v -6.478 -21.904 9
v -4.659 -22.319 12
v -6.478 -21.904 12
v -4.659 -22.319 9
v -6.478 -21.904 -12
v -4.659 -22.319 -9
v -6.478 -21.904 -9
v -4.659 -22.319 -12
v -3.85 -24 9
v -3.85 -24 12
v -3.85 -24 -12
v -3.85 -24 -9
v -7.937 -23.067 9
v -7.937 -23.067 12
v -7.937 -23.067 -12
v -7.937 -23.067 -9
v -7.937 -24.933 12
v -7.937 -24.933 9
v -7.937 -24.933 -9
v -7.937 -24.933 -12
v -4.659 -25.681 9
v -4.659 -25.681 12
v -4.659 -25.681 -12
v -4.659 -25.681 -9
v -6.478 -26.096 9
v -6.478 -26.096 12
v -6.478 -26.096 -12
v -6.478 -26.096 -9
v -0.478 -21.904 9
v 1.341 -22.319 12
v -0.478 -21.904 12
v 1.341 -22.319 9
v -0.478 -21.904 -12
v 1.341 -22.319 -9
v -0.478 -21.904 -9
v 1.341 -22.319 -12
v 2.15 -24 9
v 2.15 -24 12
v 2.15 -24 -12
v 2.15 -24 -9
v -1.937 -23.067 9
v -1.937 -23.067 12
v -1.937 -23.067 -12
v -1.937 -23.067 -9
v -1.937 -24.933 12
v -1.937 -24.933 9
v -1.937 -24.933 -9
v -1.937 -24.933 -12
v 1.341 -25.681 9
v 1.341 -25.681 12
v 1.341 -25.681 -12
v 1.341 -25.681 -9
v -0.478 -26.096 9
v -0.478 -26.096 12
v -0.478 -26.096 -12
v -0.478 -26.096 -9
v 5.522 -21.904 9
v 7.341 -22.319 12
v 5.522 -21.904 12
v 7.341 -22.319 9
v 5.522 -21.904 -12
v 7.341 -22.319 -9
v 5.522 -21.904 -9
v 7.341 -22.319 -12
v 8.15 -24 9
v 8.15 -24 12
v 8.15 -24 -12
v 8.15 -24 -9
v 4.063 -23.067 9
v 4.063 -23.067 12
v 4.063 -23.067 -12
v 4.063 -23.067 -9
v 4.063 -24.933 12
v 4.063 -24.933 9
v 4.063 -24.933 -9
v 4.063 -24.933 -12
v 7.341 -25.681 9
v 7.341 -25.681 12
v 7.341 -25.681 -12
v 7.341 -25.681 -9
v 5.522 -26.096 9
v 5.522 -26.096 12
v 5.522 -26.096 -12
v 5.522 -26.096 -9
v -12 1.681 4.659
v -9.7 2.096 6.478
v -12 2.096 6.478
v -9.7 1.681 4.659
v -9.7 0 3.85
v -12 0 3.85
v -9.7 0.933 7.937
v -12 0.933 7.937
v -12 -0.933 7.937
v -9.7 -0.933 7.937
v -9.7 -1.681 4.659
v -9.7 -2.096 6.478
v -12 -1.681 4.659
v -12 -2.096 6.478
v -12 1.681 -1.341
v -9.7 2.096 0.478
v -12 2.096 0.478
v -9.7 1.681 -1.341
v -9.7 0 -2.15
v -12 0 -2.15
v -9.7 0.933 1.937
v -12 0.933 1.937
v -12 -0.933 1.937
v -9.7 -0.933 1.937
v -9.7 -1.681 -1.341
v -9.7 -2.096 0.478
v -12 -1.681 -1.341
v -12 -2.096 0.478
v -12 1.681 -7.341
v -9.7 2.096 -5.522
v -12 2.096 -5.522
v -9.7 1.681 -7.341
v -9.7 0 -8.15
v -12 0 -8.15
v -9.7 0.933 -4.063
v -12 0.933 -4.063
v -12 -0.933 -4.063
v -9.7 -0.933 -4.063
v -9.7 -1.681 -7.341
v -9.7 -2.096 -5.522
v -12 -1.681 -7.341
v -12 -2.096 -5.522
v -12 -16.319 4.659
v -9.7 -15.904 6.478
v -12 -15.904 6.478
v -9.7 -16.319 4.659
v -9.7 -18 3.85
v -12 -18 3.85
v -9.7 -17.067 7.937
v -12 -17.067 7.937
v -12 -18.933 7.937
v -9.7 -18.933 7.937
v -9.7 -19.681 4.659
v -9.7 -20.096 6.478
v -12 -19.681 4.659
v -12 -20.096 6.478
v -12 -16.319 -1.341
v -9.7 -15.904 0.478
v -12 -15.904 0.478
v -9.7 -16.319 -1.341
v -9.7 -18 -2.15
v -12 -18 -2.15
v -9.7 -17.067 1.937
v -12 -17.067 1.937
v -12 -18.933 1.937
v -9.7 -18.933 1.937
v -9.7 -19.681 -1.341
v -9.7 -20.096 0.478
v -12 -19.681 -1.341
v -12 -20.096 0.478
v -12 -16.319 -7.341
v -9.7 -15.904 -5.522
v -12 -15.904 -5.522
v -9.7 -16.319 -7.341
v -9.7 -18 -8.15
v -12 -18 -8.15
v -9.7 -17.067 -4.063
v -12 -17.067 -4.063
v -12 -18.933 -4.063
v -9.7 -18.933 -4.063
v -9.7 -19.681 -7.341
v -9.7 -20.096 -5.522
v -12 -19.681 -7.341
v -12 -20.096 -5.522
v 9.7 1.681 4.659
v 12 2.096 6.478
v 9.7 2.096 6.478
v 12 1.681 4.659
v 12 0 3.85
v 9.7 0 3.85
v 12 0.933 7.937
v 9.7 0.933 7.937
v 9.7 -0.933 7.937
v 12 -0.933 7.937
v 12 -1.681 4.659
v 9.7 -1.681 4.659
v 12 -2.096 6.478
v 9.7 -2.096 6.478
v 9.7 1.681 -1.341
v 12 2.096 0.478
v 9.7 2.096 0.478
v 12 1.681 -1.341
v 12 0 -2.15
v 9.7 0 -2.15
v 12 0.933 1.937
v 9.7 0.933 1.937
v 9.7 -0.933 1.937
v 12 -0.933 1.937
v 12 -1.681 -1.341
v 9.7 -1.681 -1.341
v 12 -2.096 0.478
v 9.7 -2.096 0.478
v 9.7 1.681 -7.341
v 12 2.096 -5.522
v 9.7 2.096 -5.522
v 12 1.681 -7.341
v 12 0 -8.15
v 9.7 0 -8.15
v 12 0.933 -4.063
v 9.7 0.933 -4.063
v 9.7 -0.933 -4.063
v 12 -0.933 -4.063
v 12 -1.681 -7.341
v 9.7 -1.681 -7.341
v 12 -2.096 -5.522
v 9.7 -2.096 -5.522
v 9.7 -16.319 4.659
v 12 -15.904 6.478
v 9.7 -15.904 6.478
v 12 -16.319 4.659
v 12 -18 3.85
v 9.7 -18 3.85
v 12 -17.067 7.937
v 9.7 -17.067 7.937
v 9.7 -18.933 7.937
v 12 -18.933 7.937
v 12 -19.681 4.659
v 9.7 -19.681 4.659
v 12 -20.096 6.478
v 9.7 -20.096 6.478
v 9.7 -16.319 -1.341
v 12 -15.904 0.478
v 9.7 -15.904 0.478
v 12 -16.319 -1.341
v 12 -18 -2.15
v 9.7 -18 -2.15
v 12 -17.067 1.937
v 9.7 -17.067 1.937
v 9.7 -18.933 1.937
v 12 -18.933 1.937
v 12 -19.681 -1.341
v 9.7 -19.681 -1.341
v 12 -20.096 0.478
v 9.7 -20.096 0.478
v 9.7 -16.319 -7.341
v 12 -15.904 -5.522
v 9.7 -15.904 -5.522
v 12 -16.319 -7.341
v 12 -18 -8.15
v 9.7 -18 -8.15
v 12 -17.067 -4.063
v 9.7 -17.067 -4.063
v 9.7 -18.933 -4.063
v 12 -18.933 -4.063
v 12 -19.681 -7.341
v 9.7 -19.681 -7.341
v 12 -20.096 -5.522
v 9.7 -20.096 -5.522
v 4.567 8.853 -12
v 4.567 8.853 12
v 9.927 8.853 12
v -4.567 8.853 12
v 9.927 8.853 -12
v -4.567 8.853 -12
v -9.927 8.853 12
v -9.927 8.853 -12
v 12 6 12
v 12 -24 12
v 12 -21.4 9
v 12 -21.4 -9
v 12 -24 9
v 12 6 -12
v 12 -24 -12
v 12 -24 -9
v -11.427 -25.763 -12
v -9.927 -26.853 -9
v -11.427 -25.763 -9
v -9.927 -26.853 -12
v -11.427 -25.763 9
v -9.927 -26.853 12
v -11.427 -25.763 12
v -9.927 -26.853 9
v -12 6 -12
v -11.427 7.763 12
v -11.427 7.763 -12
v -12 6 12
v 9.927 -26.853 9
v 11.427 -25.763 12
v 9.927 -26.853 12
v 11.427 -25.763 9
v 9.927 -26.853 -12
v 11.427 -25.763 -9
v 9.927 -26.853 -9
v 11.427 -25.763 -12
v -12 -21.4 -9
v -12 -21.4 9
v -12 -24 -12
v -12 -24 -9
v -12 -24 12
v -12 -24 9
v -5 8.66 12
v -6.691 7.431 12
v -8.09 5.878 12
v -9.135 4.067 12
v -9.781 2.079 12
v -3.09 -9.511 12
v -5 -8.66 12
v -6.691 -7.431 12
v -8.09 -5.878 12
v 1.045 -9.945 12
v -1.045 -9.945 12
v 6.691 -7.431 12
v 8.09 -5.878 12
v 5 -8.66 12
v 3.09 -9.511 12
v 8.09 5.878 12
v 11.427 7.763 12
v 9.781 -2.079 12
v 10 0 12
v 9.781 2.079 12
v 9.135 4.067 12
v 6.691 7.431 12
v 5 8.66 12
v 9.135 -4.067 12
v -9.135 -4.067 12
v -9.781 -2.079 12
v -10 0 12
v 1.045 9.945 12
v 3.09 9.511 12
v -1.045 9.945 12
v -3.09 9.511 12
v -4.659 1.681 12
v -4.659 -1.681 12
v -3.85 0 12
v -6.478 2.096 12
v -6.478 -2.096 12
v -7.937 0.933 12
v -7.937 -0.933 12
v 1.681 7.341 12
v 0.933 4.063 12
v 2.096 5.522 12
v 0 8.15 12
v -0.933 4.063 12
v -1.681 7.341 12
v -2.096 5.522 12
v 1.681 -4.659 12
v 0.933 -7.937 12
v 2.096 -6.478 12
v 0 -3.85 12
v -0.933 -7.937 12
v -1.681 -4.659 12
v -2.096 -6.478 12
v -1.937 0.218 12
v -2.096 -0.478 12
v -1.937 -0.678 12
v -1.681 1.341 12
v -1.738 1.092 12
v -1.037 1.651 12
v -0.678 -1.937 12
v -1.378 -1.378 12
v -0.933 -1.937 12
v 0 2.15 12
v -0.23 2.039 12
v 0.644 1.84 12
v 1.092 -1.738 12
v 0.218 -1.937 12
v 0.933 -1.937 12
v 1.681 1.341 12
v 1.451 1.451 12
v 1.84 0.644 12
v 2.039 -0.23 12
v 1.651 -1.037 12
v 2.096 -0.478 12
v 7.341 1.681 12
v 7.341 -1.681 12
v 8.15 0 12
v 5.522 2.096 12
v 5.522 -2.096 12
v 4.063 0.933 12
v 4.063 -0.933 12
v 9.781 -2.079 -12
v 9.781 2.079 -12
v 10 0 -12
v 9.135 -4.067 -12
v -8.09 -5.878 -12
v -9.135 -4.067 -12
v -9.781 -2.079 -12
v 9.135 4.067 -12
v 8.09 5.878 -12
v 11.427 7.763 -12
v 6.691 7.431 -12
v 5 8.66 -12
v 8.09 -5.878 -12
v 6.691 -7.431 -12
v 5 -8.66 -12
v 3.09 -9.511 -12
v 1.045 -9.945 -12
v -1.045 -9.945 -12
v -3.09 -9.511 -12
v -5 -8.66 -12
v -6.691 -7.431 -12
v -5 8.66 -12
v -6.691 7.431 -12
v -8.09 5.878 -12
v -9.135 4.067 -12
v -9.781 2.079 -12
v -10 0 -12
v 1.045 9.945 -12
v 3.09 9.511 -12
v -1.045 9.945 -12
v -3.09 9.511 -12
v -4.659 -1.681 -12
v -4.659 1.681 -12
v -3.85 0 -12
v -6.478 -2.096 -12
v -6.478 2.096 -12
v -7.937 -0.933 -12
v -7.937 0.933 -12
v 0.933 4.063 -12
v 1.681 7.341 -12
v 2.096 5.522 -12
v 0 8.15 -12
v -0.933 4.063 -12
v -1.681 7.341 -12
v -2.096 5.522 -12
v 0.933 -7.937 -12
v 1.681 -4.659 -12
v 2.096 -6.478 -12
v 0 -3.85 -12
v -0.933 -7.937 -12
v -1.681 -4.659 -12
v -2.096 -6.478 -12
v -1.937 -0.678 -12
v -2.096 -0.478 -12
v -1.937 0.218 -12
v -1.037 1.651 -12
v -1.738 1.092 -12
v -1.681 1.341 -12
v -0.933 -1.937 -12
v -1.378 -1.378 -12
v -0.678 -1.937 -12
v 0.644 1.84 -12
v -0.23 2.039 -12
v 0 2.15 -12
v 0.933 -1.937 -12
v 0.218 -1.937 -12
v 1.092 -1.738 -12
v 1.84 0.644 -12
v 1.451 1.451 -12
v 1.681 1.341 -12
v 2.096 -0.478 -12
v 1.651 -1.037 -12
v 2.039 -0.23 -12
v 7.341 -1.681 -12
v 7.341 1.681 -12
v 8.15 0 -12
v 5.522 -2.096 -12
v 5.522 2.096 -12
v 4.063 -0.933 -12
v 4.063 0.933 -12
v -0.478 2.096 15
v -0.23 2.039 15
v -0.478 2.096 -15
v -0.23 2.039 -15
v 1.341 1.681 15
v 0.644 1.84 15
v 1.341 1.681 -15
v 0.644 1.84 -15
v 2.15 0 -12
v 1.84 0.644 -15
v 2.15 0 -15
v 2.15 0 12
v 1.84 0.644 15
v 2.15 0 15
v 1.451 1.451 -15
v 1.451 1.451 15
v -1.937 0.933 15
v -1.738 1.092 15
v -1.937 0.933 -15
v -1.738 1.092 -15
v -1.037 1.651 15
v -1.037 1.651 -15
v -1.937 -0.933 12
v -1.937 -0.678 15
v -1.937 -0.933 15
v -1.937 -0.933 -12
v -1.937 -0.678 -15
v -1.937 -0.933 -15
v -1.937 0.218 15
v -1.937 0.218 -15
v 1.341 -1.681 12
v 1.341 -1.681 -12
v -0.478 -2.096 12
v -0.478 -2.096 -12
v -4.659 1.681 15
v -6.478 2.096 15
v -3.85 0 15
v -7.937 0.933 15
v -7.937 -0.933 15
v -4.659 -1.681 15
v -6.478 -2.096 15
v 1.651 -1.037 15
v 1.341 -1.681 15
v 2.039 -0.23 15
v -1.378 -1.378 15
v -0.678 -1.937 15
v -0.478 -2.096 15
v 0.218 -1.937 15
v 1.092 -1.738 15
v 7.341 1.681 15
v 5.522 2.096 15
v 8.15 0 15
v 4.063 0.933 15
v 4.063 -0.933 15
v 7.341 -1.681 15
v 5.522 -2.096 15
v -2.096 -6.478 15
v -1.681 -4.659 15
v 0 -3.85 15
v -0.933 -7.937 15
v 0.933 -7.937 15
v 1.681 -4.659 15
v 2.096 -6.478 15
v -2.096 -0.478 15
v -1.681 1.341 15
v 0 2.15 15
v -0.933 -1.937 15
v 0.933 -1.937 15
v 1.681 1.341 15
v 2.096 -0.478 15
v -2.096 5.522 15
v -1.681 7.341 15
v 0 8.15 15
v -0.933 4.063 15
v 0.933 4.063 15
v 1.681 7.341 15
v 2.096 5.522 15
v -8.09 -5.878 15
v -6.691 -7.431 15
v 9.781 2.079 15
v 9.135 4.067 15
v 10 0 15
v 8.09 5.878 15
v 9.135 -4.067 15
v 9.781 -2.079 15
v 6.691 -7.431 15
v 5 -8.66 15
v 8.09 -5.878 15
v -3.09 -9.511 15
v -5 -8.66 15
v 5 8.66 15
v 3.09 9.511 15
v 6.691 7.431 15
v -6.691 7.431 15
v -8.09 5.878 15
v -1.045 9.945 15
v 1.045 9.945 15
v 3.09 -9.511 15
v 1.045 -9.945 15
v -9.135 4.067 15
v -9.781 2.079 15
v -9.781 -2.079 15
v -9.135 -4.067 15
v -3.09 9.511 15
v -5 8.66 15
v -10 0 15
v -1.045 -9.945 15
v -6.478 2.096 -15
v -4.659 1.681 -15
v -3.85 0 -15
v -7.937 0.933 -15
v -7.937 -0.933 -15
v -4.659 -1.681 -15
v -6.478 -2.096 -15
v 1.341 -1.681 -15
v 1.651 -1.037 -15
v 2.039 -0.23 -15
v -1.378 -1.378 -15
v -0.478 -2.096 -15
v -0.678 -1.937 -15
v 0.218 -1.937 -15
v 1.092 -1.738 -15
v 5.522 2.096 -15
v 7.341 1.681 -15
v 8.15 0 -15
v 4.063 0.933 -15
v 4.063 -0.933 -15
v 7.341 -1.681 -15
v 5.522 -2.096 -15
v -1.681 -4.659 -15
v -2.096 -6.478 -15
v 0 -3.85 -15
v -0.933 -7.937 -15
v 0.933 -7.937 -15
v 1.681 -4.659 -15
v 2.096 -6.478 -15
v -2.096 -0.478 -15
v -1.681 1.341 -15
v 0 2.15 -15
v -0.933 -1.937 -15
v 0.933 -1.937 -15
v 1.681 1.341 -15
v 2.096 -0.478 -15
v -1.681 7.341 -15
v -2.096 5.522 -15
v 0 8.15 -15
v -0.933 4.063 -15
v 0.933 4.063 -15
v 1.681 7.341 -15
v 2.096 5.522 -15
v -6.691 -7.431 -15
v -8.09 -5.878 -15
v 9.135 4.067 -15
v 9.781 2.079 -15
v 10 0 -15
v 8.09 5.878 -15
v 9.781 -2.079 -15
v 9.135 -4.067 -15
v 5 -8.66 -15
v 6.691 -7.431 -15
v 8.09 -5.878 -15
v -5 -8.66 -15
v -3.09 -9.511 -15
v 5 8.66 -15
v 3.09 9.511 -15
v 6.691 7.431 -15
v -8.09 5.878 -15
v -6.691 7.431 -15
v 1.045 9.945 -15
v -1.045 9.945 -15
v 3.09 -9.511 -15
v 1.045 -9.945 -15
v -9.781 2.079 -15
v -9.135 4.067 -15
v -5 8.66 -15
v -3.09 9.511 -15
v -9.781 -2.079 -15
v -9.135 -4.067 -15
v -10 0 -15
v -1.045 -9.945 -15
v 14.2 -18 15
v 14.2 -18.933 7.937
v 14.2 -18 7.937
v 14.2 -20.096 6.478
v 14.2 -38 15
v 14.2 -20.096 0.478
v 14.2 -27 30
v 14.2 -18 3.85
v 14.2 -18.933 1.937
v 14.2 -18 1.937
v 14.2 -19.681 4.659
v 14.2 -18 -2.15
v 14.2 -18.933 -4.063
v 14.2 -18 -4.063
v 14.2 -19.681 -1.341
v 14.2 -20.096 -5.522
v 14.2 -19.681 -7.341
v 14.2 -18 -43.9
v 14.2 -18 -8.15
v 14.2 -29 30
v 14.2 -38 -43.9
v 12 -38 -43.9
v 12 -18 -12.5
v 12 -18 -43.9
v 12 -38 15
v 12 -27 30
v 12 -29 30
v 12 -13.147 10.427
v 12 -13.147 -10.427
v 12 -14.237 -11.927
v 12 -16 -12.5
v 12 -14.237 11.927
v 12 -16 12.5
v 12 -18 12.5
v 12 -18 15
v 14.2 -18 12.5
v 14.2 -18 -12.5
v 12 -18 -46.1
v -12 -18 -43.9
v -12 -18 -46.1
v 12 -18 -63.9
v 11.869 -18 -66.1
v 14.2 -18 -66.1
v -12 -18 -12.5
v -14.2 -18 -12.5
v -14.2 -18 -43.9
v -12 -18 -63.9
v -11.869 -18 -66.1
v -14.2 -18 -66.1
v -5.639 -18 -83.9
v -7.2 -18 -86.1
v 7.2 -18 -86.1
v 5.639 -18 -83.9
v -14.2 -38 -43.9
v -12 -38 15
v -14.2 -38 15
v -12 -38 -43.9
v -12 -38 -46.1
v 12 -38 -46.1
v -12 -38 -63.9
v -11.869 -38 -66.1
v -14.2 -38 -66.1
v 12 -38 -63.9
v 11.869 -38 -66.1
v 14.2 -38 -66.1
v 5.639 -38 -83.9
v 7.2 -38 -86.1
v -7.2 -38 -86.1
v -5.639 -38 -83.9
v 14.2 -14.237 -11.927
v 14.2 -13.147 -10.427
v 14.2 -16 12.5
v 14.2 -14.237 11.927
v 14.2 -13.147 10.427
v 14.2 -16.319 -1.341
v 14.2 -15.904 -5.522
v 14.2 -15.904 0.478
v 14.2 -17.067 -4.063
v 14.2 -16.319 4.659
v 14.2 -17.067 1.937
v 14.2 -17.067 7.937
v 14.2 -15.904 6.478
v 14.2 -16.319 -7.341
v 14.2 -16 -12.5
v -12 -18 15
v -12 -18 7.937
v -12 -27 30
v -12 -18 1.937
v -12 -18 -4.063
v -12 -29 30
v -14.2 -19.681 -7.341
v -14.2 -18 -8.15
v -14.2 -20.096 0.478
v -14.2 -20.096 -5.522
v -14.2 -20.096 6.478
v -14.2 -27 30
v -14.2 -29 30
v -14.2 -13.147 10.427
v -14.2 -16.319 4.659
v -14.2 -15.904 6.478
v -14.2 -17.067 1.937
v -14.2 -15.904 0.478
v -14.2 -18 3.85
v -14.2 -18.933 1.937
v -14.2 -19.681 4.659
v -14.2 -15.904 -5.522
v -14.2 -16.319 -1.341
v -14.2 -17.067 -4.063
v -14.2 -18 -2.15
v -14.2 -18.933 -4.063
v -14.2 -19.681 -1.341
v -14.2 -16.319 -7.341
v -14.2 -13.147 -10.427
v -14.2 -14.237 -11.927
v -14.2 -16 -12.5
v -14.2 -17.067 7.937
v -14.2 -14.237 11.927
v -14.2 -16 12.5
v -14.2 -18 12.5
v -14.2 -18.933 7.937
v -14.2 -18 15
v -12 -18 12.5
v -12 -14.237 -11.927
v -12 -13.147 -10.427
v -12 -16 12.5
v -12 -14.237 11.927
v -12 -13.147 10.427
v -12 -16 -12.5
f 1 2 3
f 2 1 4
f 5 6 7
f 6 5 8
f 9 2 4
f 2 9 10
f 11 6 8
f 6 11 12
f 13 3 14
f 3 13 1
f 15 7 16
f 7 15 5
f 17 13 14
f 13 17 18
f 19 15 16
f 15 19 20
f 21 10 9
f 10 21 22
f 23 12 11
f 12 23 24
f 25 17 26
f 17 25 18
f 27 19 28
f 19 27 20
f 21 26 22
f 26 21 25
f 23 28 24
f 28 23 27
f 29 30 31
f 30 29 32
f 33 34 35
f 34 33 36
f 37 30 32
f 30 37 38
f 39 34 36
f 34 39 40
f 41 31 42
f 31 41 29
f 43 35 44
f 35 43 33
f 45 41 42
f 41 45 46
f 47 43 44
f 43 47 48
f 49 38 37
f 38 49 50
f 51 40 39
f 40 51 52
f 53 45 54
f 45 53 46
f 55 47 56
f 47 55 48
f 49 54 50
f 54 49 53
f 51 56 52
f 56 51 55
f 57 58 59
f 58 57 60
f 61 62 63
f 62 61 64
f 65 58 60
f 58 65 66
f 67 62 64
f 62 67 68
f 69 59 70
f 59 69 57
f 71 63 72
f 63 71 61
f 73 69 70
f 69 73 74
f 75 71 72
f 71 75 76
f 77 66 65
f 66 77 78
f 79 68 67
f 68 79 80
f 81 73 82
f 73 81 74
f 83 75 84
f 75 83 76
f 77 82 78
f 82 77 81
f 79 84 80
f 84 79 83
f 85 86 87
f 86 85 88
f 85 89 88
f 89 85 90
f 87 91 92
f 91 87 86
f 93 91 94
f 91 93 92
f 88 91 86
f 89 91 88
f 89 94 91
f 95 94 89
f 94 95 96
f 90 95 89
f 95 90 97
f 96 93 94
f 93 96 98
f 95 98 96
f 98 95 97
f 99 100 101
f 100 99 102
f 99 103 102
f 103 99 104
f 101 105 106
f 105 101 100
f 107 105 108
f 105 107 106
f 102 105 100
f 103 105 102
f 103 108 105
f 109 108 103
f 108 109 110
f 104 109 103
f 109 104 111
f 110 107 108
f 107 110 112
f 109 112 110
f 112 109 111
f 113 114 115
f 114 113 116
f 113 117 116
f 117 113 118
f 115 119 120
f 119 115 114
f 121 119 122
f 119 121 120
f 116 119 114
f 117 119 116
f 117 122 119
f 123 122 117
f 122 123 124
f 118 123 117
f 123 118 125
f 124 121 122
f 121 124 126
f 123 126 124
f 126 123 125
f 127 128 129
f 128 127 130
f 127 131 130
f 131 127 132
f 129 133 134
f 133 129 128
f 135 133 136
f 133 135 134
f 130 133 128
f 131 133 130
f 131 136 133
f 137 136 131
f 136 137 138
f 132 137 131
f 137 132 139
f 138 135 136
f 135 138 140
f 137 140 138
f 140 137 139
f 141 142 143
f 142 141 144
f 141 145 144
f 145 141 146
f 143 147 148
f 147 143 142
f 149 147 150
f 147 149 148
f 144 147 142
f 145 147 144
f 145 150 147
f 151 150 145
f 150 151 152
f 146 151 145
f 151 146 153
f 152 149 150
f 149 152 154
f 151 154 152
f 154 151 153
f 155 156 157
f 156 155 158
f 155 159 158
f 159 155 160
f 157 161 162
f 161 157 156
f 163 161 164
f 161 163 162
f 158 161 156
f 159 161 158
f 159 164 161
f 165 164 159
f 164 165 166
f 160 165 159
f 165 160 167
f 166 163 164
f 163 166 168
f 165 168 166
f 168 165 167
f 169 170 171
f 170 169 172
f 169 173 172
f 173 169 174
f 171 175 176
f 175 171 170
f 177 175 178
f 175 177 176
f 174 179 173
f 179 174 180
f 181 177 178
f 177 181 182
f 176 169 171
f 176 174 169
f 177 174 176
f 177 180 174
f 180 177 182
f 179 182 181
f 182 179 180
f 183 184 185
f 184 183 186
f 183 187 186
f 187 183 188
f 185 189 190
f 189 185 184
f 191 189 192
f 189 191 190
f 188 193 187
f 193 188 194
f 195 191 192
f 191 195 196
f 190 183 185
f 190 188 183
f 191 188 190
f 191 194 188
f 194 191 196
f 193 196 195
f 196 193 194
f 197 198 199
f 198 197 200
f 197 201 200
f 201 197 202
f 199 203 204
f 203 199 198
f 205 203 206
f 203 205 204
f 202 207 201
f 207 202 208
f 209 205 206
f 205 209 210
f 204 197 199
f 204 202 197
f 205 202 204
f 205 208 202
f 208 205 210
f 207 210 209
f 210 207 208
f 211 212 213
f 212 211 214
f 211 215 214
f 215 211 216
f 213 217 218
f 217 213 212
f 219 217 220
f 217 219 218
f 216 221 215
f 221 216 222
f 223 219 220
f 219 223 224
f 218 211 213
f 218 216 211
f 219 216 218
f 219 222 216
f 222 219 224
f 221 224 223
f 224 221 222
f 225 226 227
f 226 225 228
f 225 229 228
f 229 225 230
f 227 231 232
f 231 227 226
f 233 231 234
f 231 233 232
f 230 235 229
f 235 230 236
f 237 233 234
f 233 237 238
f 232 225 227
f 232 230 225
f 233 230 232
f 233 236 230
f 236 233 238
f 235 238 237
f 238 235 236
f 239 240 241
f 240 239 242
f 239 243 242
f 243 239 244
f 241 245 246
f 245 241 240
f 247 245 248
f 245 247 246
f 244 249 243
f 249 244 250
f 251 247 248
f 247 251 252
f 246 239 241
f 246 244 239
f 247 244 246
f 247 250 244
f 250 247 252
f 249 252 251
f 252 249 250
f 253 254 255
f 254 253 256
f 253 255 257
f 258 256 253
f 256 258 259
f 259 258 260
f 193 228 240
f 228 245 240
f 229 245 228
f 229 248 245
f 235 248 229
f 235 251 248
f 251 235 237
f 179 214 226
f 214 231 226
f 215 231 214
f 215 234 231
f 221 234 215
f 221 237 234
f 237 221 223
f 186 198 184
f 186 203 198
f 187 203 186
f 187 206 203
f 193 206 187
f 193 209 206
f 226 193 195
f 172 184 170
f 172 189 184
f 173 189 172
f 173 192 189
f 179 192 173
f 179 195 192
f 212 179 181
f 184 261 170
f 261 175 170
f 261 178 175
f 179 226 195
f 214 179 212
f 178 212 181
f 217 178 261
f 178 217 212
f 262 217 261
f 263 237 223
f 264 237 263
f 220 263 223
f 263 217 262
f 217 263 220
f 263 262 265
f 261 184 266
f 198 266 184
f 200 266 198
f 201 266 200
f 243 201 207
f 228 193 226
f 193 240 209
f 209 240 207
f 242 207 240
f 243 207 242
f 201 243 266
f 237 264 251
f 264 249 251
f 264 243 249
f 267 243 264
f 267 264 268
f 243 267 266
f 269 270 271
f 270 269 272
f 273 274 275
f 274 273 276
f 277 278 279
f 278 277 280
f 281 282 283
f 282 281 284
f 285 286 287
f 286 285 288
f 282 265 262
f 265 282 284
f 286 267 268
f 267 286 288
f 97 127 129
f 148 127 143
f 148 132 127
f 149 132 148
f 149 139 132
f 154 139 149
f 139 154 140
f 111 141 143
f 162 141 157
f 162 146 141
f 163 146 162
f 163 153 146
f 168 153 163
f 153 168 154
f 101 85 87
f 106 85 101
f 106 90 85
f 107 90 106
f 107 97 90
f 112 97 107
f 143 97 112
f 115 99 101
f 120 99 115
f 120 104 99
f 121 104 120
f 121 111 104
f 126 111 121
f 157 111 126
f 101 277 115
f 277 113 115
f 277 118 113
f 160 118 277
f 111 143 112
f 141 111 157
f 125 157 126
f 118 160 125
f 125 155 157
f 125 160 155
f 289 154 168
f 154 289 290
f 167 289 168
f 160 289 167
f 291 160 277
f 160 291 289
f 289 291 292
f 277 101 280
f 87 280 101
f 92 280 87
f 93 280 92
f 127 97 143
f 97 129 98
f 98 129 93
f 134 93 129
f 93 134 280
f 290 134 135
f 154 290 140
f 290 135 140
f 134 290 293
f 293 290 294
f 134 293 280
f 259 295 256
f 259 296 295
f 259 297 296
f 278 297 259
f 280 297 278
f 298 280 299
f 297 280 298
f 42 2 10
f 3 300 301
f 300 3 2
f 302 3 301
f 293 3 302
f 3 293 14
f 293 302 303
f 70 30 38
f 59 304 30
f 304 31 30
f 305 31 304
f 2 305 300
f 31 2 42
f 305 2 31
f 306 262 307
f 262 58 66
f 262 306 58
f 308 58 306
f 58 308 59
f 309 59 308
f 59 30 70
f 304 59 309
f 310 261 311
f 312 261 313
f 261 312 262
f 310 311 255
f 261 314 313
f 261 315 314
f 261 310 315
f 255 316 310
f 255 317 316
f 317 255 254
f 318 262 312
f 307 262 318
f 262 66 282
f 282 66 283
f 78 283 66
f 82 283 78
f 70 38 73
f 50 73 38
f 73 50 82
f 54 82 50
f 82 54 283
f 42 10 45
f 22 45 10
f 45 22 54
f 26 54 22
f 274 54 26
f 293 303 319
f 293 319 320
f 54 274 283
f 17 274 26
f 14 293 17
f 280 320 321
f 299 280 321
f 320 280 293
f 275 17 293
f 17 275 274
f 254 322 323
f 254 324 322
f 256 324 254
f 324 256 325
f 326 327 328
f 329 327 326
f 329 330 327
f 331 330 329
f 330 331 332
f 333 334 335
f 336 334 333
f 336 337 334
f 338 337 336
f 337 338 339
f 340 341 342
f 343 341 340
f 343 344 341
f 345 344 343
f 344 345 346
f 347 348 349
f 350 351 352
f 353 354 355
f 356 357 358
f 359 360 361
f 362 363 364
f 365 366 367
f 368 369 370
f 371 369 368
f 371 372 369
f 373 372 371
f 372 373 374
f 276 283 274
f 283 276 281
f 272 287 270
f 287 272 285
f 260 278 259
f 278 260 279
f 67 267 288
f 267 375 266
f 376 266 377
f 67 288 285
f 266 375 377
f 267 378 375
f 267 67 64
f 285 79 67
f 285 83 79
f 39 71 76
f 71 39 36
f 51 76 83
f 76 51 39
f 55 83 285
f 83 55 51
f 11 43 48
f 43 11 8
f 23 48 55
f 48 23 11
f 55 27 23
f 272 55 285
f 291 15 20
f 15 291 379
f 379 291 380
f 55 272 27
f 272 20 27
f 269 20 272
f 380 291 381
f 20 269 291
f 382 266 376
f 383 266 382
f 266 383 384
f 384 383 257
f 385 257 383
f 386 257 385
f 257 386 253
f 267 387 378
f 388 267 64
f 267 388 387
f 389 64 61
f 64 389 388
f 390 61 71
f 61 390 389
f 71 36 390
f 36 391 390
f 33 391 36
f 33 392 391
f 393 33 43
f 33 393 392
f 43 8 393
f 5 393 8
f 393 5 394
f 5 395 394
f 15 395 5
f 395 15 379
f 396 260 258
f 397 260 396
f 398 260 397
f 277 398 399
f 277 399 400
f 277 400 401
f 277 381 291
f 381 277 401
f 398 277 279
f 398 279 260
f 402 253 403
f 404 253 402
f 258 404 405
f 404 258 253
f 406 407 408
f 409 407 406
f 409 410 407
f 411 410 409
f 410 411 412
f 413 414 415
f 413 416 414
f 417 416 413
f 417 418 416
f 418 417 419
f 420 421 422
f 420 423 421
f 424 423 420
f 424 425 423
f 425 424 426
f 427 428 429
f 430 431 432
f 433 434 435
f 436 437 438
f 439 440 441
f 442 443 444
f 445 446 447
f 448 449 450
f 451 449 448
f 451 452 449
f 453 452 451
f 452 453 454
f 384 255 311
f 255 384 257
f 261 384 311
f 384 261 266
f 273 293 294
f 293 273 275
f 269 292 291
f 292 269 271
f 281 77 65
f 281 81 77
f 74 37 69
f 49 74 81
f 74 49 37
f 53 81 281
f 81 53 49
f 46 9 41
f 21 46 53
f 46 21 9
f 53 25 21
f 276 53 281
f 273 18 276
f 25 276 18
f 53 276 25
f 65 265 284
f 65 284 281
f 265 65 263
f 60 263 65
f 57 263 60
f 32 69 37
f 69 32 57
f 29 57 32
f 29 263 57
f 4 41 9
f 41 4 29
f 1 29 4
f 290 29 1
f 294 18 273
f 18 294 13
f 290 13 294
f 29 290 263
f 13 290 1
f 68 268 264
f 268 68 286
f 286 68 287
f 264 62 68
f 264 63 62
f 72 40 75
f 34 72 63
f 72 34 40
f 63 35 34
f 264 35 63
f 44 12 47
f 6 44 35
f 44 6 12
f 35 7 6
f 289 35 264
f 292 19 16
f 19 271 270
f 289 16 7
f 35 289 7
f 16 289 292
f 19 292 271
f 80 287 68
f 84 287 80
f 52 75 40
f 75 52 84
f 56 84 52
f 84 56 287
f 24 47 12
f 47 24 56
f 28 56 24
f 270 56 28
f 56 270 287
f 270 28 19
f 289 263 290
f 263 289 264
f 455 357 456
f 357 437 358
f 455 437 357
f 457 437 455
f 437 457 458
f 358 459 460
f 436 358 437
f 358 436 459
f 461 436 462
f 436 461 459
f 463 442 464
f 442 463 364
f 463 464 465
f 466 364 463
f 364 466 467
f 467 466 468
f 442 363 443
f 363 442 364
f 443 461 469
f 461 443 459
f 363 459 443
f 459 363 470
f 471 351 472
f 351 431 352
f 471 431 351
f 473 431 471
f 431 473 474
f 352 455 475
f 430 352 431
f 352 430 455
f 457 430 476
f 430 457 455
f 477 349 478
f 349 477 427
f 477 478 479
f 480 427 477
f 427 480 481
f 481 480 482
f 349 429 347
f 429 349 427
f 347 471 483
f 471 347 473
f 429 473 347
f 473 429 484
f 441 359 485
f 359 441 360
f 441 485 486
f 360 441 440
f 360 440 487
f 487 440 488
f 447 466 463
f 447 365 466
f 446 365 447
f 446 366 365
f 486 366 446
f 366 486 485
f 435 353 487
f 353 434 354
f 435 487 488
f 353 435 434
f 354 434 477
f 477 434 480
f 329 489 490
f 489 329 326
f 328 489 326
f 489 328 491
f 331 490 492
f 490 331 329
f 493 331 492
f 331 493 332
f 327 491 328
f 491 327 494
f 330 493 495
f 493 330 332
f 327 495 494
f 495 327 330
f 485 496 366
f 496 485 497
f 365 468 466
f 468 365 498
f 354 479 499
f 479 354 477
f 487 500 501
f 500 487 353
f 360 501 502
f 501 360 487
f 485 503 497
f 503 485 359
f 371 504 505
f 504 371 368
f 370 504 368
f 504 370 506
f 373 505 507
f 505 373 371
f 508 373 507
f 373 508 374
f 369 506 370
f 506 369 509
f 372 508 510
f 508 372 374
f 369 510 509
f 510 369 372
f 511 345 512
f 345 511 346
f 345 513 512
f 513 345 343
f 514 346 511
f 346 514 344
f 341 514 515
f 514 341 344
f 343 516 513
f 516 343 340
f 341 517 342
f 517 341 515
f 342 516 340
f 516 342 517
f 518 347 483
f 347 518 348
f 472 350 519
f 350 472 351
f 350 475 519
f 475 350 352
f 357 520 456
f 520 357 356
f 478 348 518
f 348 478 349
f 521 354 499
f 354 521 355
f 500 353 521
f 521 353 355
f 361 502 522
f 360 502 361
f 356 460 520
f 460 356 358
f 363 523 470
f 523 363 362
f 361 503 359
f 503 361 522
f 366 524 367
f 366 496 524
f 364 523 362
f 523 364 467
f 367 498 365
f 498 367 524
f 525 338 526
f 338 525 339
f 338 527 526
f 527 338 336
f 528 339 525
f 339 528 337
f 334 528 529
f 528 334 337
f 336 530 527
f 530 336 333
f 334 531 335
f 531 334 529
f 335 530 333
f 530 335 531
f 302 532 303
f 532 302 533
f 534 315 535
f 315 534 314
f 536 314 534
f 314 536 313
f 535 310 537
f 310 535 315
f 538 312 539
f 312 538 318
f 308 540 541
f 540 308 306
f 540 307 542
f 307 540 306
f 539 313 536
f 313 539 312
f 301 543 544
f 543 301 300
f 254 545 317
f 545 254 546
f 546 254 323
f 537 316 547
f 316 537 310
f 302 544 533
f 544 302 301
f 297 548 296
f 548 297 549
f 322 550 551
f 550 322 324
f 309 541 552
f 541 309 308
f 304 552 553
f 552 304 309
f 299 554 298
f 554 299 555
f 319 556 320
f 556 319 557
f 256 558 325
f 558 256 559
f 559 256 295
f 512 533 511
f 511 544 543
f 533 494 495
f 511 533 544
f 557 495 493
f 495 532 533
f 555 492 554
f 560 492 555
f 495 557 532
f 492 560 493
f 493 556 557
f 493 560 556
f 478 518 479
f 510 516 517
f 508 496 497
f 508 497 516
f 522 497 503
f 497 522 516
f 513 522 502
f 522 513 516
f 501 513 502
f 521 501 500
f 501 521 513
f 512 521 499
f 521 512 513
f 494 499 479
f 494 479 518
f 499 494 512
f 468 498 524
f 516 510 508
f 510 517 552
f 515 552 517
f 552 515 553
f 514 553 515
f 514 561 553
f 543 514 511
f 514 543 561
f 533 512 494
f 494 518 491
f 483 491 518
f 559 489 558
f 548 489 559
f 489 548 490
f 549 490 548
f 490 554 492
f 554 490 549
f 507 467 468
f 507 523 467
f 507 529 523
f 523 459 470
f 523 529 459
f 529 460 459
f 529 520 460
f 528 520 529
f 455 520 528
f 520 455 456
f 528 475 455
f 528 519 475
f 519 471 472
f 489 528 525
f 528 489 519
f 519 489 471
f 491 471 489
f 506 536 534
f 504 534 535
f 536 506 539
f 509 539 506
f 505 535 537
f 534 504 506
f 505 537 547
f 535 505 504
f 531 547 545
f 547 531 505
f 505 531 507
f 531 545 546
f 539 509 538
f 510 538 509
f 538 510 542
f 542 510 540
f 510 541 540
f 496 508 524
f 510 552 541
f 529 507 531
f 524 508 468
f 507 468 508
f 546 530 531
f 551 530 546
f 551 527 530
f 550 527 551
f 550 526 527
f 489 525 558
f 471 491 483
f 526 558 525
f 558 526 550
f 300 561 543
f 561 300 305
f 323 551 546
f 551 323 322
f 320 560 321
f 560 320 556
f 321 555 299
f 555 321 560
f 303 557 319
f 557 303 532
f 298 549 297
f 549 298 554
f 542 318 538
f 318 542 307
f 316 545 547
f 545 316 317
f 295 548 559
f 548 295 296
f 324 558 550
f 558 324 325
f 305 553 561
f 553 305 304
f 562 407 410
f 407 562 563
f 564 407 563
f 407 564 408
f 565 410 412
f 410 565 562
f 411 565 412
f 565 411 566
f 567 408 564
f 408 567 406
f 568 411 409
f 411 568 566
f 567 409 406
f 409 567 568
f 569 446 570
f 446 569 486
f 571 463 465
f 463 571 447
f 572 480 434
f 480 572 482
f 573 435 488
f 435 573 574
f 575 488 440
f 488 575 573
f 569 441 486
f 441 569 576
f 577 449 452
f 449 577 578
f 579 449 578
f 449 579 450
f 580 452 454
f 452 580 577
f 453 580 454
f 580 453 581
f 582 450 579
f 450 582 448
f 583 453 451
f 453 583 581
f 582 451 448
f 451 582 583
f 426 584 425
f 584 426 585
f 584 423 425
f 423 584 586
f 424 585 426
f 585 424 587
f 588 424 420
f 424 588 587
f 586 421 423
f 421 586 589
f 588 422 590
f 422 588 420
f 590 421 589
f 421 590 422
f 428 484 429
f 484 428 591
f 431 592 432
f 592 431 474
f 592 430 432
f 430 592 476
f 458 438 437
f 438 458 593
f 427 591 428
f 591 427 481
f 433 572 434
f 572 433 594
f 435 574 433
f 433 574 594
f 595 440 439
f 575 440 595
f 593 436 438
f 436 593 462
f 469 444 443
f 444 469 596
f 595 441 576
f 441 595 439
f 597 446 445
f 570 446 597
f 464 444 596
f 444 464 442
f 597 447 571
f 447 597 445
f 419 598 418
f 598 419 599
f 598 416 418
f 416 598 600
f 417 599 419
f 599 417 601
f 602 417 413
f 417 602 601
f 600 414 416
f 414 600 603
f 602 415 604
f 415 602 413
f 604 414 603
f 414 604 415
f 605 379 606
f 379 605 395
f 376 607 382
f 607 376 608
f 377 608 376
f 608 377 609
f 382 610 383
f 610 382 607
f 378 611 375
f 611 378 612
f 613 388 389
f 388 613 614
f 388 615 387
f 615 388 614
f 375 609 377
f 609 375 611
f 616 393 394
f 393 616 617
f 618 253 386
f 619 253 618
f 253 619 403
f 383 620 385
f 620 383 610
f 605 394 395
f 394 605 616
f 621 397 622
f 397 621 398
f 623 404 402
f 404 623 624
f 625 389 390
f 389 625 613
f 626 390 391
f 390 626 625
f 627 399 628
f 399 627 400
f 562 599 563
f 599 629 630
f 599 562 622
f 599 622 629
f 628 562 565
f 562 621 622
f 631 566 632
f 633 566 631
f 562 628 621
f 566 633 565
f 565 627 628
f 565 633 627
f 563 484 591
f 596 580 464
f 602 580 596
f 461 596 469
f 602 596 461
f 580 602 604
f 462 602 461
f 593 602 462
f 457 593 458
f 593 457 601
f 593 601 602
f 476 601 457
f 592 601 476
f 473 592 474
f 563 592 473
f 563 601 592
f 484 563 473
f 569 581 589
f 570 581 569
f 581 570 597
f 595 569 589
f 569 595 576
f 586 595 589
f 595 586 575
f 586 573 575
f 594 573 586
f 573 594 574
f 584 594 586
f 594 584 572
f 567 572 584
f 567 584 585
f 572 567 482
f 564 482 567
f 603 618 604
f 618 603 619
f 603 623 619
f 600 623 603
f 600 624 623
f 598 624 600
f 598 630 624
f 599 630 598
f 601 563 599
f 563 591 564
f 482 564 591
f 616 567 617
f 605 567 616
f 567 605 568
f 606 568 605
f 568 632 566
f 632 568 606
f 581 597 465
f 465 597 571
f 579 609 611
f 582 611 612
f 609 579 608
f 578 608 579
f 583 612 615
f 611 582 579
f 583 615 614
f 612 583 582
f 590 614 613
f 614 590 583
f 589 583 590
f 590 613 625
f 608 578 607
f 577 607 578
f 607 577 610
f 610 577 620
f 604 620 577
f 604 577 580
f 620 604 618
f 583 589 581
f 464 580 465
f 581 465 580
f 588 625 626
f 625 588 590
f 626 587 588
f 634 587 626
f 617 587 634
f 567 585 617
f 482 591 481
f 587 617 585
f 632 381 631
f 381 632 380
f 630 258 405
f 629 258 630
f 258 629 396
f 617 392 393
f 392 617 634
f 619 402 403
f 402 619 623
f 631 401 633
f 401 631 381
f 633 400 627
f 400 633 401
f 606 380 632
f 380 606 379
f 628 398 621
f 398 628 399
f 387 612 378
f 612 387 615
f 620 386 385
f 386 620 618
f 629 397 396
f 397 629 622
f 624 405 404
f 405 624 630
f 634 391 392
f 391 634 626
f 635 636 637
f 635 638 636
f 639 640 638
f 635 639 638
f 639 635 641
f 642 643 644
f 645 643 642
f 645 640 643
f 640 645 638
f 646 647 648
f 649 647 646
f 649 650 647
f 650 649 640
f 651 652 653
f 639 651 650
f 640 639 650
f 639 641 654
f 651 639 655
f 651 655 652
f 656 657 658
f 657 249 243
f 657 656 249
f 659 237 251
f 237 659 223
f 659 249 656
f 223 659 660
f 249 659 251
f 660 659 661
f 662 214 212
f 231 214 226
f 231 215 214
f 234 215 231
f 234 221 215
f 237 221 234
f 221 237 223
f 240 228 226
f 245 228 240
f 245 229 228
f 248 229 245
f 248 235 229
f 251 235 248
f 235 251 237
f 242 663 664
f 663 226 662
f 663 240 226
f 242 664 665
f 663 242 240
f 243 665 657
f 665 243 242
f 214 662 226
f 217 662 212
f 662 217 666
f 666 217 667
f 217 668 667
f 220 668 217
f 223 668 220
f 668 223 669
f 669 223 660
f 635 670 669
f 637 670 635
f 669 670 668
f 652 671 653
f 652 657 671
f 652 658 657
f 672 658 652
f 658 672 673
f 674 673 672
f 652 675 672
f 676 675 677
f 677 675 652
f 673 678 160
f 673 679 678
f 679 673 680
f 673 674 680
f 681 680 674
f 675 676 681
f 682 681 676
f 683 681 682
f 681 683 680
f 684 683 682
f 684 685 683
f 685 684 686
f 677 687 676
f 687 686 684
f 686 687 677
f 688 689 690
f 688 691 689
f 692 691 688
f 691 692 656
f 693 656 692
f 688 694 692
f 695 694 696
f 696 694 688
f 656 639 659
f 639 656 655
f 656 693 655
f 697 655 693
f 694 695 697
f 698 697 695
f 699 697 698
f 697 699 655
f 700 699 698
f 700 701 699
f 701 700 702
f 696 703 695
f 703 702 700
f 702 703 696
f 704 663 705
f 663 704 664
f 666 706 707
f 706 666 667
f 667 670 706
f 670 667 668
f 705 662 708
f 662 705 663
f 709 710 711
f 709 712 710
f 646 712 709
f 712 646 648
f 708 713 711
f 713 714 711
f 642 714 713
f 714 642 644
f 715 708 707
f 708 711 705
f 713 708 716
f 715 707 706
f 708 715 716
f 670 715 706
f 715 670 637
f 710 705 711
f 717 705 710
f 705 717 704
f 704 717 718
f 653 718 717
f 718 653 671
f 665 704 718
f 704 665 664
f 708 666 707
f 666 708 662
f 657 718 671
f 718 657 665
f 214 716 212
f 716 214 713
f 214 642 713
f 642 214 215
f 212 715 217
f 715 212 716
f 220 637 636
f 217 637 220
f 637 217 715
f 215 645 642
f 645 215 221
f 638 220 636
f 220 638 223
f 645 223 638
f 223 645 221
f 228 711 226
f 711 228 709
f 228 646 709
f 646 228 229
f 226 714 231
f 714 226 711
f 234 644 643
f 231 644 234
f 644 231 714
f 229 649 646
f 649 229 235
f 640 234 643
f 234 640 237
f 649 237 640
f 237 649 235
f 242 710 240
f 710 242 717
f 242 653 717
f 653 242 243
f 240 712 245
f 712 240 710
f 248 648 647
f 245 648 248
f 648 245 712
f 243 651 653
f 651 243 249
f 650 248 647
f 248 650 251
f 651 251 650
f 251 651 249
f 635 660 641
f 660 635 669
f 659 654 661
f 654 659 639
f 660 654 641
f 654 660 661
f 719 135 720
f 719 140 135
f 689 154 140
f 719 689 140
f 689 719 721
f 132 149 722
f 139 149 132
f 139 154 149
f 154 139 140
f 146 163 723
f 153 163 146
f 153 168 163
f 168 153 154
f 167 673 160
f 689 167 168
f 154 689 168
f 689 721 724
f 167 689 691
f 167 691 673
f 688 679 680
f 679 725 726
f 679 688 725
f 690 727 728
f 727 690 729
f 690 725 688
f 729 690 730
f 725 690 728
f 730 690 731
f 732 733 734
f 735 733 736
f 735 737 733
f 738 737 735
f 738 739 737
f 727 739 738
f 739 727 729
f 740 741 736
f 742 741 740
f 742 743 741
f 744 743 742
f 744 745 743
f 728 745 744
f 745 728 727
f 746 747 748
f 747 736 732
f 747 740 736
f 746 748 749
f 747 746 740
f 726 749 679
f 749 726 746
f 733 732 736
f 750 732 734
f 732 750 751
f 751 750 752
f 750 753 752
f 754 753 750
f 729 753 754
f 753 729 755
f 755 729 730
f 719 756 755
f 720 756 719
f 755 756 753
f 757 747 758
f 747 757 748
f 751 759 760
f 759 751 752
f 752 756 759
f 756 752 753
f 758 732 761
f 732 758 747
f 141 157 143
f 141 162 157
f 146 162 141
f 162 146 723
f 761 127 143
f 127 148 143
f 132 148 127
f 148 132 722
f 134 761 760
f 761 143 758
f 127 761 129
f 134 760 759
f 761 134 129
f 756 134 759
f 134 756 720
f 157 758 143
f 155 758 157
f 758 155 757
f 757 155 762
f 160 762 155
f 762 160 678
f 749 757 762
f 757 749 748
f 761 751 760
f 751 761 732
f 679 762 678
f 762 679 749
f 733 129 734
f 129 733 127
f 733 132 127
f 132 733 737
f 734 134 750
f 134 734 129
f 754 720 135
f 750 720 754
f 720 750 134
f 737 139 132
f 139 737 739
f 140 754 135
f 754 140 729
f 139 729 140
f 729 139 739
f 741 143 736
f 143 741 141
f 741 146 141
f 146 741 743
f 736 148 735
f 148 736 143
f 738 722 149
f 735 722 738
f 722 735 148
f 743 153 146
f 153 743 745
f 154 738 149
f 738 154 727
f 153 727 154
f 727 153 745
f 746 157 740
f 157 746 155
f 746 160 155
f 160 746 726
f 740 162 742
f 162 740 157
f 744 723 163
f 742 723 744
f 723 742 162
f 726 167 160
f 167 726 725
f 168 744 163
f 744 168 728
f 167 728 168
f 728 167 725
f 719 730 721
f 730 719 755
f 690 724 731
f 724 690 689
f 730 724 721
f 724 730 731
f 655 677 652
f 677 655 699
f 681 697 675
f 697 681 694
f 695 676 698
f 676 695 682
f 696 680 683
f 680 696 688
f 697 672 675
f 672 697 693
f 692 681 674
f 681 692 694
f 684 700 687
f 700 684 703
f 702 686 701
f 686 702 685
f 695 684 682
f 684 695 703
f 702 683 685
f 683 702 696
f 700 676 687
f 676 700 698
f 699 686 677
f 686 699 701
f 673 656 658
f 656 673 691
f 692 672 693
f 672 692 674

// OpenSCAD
// file: ../models/arm.scad
Collisions=false;
include <ollo.scad>;

module arm_pulley(pulley=false)
{
	c = pulley?[0.6,0.6,0.6]:[0.2,0.2,0.2];
    if (!Collisions) {
	    color(c) {
		difference() {
		    cylinder(d=20, h=OlloWidth);
		    servoArm(OlloWidth, false);
		}
	    }
    }
}

//:Model "Arm" [0.1,0.1,0.1]
module arm(pulley=false) {
    arm_pulley();
}

//:Model "Pulley" [0.6,0.6,0.6]
module pulley() {
    //:BOM "Ollo pulley" 0.2 http://www.robotis-shop-en.com/?act=shop_en.goods_view&GS=1590
    arm_pulley(true);
}

arm();
// file: ../models/motor.scad
Collisions=false;
include <ollo.scad>;
include <motor_values.scad>;
use <../util/rounded.scad>;

//:Model "Motor" [0.4,0.45,0.4]
//:Mass 16.7
module motor(thickness=2.2) {
    //:BOM "XL-320 Servo" 21.9 http://www.robotis-shop-en.com/?act=shop_en.goods_view&GS=1611
    translate([0,-MotorArmOffset,-MotorDepth/2]) {
        color([0.25,0.25,0.25]) {
            difference() {
                rounded(MotorWidth,MotorHeight,MotorDepth,3,center=true);

		if (!Collisions) {
			// Bottom
			translate([-MotorWidth/2-0.1,-MotorHeight/2-0.1,3])
			    cube([MotorWidth+0.2, 5.7, MotorDepth-6]);

			translate([0,-MotorHeight/2+3])
			    threeOllo(MotorDepth, false);

			// Motor shaft
			translate([0, MotorArmOffset])
			    olloHole(MotorDepth+5, false);

			// Side holes
			for (side=[-MotorWidth/2,MotorWidth/2-thickness]) {
			    translate([side,9,MotorDepth/2]) {
				rotate([0,90,0]) {
				    threeOllo(thickness, false);
				    translate([0,-3*OlloSpacing,0])
					threeOllo(thickness, false);
				}
			    }
			}
		}
            }
        }
    }
}

motor();
// file: ../util/rounded.scad
Collisions=false;

// Do a rounded cube
module rounded(x=10, y=10, z=10, r=3, center=false) {
    if (Collisions) {
        translate([0,0,center?(z/2):0])
            cube([x,y,z], center=center);
    } else {
        if (center) {
            translate([-(x/2),-(y/2),0])
                rounded(x, y, z, r);
        } else {
            translate([r,r,0])
                minkowski() {
                    cube([x-2*r,y-2*r,z/2]);
                    cylinder(h=z/2, r=r);
                }
        }
    }
}
// file: ../models/ollo.scad
Collisions=false;

// Diameter of plastic ollo holes
OlloHoles = 4.3;

// Width of Ollo "real" plastic
OlloWidth = 3;

// Distance between two ollo holes
OlloSpacing = 6;

module rivet()
{
    //:BOM "Ollo rivet" 0.05 http://www.robotis-shop-en.com/?act=shop_en.goods_view&GS=1605
}

// Do an Ollo hole on the part
module olloHole(depth=2.2, rivet=true)
{
    if (!Collisions) {
        if (rivet) {
	    rivet();
        }
        translate([0,0,-0.1])
            cylinder(depth+0.2, OlloHoles/2, OlloHoles/2);
    }	    
}

// Do 3 ollo holes
module threeOllo(depth=2.2, rivets=true)
{
    for (xy=[[-OlloSpacing,0],[0,0],[OlloSpacing,0]]) {
        translate([xy[0], xy[1], 0])
            olloHole(depth, rivets);
    }
}

// Do a servo arm holes
module servoArm(depth=2.2, rivets=true)
{
    if (rivets) {
        for (i=[1:5]) {
	    rivet();
	}
    }
    threeOllo(depth, false);
    rotate([0,0,90])
        threeOllo(depth, false);
}
// file: ../models/motor_values.scad
// Motor dimensions
MotorWidth = 24; 
MotorHeight = 36; 
MotorDepth = 24; 
MotorArmOffset = 9;
// file: ../models/motor_arm.scad
include <motor.scad>;
use <arm.scad>;

module motorArm(counterArm=true) {
    motor();
    translate([0,0,MotorDepth/2])
        arm();
    if (counterArm) {
        translate([0,0,-MotorDepth/2-OlloWidth]) {
            pulley();
        }
    }
}

motorArm();
// file: ../parts/leg.scad
Collisions=false;
SphereTip=false;
include <../models/motor_values.scad>;
use <../models/ollo.scad>;
use <../util/rounded.scad>;

//:Part
module leg(sizeA=60, sizeB=20, sizeC=20, sizeBottom=10,
        sizeTop=15, mode="arm", fixationAngle=0, thickness=2.2, holesPosition=15, print=false)
{
    xOffset = (mode == "side") ? -10 : 0;
    spacing = (mode == "side" || mode == "bottom") ? MotorWidth : MotorWidth+6;

    module legSide()
    {
        difference() {
            union() {
                translate([0,0,sizeA/2])
                    rotate([0,90,0]) {
                        cube([sizeA, 20, thickness], center=true);
                        if (mode == "side") {
                            translate([15-sizeA/2, 10, -thickness/2])
                                rotate([0,0,+fixationAngle])
                                rounded(25,10,thickness, center=true);
                        }
                    }
            }
            translate([-thickness, 0, sizeA-holesPosition]) {
                rotate([90,0,90]) {
                    if (mode == "arm") {
                        servoArm(2*thickness);
                    }
                }
                if (mode == "side") {
                    translate([0,10,0])
                        rotate([90,90-fixationAngle,90])
                        threeOllo(2*thickness);
                }
		if (mode == "bottom") {
                    translate([0,0,0])
                        rotate([90,fixationAngle,90])
                        threeOllo(2*thickness);
                }
            }
        }
	if (Collisions) {
		translate([0,0,sizeA+sizeTop-10]) {
			rotate([45,0,0])
			rotate([0,-90,0])
			cube([14,14,thickness],center=true);
		}
	} else {
		translate([-thickness/2,0,sizeA]) {
		    rotate([90,0,90])
			linear_extrude(thickness)
			polygon([[-10,0],[-1,sizeTop],[1,sizeTop],[10,0]]);
		}
	}
    }

    module biais() {
        Dx = (spacing-sizeBottom)/2;
        Dy = sizeC;
        Dl = sqrt(pow(Dx,2)+pow(Dy,2));

        translate([-(spacing/2)-thickness,-10,-(sizeB+thickness/2)])
            rotate([0,atan2(Dy,Dx),0])
            cube([Dl,20,thickness]);
    }

    if (print) {
        translate([0,0,10-xOffset])
            rotate([90,0,0])
            leg(sizeA, sizeB, sizeC, sizeBottom,
                    sizeTop, mode, fixationAngle, thickness, false);
    } else {
        translate([0,xOffset,-sizeA+holesPosition]) {
            cube([spacing+thickness*2, 20, thickness], center=true);

            translate([spacing/2+thickness/2,0,0])
                legSide();
            translate([-(spacing/2+thickness/2),0,0])
                legSide();

		if (!SphereTip || !Collisions) {
		    translate([0,0,-sizeB])
			cube([spacing+thickness*2, 20, thickness], center=true);
		    translate([spacing/2+thickness/2,0,-sizeB/2])
			cube([thickness,20,sizeB], center=true);
		    translate([-(spacing/2+thickness/2),0,-sizeB/2])
			cube([thickness,20,sizeB], center=true);

		    translate([0,0,-(sizeB+sizeC)])
			cube([sizeBottom+thickness*2, 20, thickness], center=true);

		    biais();
		    mirror([1,0,0])
			biais();
		} else {
		    translate([0,0,-(sizeB+sizeC+thickness)+20])
			sphere(20);  
		}
		translate([0,0,-(sizeB+sizeC+thickness)]) {
                        //:Tip
			//sphere(7);
		}
        }
    }
}

leg();
// main file
use <../parts/leg.scad>;
use <../models/motor_arm.scad>;

//:Component "Side leg"
//:Description "Leg on motor side"
//:Parameter SizeA "Size of the first part"
//:Parameter SizeB "Size of the second part"
//:Parameter SizeC "Size of the third part"
//:Parameter SizeBottom "Size of the bottom"
//:Parameter SizeTop "Size of the top"
//:Parameter FixationAngle "Fixation angle"
//:Parameter Thickness "Thickness of the part"
module side_leg(SizeA=60, SizeB=20, SizeC=20, SizeBottom=10,
        SizeTop=15, FixationAngle=0, Thickness=2.2)
{
    //:Anchor motor male
    motorArm();

    translate([0,-(18),0]) {
    rotate([-FixationAngle,0,0]) {
	leg(SizeA, SizeB, SizeC, SizeBottom, SizeTop, "side", FixationAngle, Thickness);
    }
    }
}

side_leg();
